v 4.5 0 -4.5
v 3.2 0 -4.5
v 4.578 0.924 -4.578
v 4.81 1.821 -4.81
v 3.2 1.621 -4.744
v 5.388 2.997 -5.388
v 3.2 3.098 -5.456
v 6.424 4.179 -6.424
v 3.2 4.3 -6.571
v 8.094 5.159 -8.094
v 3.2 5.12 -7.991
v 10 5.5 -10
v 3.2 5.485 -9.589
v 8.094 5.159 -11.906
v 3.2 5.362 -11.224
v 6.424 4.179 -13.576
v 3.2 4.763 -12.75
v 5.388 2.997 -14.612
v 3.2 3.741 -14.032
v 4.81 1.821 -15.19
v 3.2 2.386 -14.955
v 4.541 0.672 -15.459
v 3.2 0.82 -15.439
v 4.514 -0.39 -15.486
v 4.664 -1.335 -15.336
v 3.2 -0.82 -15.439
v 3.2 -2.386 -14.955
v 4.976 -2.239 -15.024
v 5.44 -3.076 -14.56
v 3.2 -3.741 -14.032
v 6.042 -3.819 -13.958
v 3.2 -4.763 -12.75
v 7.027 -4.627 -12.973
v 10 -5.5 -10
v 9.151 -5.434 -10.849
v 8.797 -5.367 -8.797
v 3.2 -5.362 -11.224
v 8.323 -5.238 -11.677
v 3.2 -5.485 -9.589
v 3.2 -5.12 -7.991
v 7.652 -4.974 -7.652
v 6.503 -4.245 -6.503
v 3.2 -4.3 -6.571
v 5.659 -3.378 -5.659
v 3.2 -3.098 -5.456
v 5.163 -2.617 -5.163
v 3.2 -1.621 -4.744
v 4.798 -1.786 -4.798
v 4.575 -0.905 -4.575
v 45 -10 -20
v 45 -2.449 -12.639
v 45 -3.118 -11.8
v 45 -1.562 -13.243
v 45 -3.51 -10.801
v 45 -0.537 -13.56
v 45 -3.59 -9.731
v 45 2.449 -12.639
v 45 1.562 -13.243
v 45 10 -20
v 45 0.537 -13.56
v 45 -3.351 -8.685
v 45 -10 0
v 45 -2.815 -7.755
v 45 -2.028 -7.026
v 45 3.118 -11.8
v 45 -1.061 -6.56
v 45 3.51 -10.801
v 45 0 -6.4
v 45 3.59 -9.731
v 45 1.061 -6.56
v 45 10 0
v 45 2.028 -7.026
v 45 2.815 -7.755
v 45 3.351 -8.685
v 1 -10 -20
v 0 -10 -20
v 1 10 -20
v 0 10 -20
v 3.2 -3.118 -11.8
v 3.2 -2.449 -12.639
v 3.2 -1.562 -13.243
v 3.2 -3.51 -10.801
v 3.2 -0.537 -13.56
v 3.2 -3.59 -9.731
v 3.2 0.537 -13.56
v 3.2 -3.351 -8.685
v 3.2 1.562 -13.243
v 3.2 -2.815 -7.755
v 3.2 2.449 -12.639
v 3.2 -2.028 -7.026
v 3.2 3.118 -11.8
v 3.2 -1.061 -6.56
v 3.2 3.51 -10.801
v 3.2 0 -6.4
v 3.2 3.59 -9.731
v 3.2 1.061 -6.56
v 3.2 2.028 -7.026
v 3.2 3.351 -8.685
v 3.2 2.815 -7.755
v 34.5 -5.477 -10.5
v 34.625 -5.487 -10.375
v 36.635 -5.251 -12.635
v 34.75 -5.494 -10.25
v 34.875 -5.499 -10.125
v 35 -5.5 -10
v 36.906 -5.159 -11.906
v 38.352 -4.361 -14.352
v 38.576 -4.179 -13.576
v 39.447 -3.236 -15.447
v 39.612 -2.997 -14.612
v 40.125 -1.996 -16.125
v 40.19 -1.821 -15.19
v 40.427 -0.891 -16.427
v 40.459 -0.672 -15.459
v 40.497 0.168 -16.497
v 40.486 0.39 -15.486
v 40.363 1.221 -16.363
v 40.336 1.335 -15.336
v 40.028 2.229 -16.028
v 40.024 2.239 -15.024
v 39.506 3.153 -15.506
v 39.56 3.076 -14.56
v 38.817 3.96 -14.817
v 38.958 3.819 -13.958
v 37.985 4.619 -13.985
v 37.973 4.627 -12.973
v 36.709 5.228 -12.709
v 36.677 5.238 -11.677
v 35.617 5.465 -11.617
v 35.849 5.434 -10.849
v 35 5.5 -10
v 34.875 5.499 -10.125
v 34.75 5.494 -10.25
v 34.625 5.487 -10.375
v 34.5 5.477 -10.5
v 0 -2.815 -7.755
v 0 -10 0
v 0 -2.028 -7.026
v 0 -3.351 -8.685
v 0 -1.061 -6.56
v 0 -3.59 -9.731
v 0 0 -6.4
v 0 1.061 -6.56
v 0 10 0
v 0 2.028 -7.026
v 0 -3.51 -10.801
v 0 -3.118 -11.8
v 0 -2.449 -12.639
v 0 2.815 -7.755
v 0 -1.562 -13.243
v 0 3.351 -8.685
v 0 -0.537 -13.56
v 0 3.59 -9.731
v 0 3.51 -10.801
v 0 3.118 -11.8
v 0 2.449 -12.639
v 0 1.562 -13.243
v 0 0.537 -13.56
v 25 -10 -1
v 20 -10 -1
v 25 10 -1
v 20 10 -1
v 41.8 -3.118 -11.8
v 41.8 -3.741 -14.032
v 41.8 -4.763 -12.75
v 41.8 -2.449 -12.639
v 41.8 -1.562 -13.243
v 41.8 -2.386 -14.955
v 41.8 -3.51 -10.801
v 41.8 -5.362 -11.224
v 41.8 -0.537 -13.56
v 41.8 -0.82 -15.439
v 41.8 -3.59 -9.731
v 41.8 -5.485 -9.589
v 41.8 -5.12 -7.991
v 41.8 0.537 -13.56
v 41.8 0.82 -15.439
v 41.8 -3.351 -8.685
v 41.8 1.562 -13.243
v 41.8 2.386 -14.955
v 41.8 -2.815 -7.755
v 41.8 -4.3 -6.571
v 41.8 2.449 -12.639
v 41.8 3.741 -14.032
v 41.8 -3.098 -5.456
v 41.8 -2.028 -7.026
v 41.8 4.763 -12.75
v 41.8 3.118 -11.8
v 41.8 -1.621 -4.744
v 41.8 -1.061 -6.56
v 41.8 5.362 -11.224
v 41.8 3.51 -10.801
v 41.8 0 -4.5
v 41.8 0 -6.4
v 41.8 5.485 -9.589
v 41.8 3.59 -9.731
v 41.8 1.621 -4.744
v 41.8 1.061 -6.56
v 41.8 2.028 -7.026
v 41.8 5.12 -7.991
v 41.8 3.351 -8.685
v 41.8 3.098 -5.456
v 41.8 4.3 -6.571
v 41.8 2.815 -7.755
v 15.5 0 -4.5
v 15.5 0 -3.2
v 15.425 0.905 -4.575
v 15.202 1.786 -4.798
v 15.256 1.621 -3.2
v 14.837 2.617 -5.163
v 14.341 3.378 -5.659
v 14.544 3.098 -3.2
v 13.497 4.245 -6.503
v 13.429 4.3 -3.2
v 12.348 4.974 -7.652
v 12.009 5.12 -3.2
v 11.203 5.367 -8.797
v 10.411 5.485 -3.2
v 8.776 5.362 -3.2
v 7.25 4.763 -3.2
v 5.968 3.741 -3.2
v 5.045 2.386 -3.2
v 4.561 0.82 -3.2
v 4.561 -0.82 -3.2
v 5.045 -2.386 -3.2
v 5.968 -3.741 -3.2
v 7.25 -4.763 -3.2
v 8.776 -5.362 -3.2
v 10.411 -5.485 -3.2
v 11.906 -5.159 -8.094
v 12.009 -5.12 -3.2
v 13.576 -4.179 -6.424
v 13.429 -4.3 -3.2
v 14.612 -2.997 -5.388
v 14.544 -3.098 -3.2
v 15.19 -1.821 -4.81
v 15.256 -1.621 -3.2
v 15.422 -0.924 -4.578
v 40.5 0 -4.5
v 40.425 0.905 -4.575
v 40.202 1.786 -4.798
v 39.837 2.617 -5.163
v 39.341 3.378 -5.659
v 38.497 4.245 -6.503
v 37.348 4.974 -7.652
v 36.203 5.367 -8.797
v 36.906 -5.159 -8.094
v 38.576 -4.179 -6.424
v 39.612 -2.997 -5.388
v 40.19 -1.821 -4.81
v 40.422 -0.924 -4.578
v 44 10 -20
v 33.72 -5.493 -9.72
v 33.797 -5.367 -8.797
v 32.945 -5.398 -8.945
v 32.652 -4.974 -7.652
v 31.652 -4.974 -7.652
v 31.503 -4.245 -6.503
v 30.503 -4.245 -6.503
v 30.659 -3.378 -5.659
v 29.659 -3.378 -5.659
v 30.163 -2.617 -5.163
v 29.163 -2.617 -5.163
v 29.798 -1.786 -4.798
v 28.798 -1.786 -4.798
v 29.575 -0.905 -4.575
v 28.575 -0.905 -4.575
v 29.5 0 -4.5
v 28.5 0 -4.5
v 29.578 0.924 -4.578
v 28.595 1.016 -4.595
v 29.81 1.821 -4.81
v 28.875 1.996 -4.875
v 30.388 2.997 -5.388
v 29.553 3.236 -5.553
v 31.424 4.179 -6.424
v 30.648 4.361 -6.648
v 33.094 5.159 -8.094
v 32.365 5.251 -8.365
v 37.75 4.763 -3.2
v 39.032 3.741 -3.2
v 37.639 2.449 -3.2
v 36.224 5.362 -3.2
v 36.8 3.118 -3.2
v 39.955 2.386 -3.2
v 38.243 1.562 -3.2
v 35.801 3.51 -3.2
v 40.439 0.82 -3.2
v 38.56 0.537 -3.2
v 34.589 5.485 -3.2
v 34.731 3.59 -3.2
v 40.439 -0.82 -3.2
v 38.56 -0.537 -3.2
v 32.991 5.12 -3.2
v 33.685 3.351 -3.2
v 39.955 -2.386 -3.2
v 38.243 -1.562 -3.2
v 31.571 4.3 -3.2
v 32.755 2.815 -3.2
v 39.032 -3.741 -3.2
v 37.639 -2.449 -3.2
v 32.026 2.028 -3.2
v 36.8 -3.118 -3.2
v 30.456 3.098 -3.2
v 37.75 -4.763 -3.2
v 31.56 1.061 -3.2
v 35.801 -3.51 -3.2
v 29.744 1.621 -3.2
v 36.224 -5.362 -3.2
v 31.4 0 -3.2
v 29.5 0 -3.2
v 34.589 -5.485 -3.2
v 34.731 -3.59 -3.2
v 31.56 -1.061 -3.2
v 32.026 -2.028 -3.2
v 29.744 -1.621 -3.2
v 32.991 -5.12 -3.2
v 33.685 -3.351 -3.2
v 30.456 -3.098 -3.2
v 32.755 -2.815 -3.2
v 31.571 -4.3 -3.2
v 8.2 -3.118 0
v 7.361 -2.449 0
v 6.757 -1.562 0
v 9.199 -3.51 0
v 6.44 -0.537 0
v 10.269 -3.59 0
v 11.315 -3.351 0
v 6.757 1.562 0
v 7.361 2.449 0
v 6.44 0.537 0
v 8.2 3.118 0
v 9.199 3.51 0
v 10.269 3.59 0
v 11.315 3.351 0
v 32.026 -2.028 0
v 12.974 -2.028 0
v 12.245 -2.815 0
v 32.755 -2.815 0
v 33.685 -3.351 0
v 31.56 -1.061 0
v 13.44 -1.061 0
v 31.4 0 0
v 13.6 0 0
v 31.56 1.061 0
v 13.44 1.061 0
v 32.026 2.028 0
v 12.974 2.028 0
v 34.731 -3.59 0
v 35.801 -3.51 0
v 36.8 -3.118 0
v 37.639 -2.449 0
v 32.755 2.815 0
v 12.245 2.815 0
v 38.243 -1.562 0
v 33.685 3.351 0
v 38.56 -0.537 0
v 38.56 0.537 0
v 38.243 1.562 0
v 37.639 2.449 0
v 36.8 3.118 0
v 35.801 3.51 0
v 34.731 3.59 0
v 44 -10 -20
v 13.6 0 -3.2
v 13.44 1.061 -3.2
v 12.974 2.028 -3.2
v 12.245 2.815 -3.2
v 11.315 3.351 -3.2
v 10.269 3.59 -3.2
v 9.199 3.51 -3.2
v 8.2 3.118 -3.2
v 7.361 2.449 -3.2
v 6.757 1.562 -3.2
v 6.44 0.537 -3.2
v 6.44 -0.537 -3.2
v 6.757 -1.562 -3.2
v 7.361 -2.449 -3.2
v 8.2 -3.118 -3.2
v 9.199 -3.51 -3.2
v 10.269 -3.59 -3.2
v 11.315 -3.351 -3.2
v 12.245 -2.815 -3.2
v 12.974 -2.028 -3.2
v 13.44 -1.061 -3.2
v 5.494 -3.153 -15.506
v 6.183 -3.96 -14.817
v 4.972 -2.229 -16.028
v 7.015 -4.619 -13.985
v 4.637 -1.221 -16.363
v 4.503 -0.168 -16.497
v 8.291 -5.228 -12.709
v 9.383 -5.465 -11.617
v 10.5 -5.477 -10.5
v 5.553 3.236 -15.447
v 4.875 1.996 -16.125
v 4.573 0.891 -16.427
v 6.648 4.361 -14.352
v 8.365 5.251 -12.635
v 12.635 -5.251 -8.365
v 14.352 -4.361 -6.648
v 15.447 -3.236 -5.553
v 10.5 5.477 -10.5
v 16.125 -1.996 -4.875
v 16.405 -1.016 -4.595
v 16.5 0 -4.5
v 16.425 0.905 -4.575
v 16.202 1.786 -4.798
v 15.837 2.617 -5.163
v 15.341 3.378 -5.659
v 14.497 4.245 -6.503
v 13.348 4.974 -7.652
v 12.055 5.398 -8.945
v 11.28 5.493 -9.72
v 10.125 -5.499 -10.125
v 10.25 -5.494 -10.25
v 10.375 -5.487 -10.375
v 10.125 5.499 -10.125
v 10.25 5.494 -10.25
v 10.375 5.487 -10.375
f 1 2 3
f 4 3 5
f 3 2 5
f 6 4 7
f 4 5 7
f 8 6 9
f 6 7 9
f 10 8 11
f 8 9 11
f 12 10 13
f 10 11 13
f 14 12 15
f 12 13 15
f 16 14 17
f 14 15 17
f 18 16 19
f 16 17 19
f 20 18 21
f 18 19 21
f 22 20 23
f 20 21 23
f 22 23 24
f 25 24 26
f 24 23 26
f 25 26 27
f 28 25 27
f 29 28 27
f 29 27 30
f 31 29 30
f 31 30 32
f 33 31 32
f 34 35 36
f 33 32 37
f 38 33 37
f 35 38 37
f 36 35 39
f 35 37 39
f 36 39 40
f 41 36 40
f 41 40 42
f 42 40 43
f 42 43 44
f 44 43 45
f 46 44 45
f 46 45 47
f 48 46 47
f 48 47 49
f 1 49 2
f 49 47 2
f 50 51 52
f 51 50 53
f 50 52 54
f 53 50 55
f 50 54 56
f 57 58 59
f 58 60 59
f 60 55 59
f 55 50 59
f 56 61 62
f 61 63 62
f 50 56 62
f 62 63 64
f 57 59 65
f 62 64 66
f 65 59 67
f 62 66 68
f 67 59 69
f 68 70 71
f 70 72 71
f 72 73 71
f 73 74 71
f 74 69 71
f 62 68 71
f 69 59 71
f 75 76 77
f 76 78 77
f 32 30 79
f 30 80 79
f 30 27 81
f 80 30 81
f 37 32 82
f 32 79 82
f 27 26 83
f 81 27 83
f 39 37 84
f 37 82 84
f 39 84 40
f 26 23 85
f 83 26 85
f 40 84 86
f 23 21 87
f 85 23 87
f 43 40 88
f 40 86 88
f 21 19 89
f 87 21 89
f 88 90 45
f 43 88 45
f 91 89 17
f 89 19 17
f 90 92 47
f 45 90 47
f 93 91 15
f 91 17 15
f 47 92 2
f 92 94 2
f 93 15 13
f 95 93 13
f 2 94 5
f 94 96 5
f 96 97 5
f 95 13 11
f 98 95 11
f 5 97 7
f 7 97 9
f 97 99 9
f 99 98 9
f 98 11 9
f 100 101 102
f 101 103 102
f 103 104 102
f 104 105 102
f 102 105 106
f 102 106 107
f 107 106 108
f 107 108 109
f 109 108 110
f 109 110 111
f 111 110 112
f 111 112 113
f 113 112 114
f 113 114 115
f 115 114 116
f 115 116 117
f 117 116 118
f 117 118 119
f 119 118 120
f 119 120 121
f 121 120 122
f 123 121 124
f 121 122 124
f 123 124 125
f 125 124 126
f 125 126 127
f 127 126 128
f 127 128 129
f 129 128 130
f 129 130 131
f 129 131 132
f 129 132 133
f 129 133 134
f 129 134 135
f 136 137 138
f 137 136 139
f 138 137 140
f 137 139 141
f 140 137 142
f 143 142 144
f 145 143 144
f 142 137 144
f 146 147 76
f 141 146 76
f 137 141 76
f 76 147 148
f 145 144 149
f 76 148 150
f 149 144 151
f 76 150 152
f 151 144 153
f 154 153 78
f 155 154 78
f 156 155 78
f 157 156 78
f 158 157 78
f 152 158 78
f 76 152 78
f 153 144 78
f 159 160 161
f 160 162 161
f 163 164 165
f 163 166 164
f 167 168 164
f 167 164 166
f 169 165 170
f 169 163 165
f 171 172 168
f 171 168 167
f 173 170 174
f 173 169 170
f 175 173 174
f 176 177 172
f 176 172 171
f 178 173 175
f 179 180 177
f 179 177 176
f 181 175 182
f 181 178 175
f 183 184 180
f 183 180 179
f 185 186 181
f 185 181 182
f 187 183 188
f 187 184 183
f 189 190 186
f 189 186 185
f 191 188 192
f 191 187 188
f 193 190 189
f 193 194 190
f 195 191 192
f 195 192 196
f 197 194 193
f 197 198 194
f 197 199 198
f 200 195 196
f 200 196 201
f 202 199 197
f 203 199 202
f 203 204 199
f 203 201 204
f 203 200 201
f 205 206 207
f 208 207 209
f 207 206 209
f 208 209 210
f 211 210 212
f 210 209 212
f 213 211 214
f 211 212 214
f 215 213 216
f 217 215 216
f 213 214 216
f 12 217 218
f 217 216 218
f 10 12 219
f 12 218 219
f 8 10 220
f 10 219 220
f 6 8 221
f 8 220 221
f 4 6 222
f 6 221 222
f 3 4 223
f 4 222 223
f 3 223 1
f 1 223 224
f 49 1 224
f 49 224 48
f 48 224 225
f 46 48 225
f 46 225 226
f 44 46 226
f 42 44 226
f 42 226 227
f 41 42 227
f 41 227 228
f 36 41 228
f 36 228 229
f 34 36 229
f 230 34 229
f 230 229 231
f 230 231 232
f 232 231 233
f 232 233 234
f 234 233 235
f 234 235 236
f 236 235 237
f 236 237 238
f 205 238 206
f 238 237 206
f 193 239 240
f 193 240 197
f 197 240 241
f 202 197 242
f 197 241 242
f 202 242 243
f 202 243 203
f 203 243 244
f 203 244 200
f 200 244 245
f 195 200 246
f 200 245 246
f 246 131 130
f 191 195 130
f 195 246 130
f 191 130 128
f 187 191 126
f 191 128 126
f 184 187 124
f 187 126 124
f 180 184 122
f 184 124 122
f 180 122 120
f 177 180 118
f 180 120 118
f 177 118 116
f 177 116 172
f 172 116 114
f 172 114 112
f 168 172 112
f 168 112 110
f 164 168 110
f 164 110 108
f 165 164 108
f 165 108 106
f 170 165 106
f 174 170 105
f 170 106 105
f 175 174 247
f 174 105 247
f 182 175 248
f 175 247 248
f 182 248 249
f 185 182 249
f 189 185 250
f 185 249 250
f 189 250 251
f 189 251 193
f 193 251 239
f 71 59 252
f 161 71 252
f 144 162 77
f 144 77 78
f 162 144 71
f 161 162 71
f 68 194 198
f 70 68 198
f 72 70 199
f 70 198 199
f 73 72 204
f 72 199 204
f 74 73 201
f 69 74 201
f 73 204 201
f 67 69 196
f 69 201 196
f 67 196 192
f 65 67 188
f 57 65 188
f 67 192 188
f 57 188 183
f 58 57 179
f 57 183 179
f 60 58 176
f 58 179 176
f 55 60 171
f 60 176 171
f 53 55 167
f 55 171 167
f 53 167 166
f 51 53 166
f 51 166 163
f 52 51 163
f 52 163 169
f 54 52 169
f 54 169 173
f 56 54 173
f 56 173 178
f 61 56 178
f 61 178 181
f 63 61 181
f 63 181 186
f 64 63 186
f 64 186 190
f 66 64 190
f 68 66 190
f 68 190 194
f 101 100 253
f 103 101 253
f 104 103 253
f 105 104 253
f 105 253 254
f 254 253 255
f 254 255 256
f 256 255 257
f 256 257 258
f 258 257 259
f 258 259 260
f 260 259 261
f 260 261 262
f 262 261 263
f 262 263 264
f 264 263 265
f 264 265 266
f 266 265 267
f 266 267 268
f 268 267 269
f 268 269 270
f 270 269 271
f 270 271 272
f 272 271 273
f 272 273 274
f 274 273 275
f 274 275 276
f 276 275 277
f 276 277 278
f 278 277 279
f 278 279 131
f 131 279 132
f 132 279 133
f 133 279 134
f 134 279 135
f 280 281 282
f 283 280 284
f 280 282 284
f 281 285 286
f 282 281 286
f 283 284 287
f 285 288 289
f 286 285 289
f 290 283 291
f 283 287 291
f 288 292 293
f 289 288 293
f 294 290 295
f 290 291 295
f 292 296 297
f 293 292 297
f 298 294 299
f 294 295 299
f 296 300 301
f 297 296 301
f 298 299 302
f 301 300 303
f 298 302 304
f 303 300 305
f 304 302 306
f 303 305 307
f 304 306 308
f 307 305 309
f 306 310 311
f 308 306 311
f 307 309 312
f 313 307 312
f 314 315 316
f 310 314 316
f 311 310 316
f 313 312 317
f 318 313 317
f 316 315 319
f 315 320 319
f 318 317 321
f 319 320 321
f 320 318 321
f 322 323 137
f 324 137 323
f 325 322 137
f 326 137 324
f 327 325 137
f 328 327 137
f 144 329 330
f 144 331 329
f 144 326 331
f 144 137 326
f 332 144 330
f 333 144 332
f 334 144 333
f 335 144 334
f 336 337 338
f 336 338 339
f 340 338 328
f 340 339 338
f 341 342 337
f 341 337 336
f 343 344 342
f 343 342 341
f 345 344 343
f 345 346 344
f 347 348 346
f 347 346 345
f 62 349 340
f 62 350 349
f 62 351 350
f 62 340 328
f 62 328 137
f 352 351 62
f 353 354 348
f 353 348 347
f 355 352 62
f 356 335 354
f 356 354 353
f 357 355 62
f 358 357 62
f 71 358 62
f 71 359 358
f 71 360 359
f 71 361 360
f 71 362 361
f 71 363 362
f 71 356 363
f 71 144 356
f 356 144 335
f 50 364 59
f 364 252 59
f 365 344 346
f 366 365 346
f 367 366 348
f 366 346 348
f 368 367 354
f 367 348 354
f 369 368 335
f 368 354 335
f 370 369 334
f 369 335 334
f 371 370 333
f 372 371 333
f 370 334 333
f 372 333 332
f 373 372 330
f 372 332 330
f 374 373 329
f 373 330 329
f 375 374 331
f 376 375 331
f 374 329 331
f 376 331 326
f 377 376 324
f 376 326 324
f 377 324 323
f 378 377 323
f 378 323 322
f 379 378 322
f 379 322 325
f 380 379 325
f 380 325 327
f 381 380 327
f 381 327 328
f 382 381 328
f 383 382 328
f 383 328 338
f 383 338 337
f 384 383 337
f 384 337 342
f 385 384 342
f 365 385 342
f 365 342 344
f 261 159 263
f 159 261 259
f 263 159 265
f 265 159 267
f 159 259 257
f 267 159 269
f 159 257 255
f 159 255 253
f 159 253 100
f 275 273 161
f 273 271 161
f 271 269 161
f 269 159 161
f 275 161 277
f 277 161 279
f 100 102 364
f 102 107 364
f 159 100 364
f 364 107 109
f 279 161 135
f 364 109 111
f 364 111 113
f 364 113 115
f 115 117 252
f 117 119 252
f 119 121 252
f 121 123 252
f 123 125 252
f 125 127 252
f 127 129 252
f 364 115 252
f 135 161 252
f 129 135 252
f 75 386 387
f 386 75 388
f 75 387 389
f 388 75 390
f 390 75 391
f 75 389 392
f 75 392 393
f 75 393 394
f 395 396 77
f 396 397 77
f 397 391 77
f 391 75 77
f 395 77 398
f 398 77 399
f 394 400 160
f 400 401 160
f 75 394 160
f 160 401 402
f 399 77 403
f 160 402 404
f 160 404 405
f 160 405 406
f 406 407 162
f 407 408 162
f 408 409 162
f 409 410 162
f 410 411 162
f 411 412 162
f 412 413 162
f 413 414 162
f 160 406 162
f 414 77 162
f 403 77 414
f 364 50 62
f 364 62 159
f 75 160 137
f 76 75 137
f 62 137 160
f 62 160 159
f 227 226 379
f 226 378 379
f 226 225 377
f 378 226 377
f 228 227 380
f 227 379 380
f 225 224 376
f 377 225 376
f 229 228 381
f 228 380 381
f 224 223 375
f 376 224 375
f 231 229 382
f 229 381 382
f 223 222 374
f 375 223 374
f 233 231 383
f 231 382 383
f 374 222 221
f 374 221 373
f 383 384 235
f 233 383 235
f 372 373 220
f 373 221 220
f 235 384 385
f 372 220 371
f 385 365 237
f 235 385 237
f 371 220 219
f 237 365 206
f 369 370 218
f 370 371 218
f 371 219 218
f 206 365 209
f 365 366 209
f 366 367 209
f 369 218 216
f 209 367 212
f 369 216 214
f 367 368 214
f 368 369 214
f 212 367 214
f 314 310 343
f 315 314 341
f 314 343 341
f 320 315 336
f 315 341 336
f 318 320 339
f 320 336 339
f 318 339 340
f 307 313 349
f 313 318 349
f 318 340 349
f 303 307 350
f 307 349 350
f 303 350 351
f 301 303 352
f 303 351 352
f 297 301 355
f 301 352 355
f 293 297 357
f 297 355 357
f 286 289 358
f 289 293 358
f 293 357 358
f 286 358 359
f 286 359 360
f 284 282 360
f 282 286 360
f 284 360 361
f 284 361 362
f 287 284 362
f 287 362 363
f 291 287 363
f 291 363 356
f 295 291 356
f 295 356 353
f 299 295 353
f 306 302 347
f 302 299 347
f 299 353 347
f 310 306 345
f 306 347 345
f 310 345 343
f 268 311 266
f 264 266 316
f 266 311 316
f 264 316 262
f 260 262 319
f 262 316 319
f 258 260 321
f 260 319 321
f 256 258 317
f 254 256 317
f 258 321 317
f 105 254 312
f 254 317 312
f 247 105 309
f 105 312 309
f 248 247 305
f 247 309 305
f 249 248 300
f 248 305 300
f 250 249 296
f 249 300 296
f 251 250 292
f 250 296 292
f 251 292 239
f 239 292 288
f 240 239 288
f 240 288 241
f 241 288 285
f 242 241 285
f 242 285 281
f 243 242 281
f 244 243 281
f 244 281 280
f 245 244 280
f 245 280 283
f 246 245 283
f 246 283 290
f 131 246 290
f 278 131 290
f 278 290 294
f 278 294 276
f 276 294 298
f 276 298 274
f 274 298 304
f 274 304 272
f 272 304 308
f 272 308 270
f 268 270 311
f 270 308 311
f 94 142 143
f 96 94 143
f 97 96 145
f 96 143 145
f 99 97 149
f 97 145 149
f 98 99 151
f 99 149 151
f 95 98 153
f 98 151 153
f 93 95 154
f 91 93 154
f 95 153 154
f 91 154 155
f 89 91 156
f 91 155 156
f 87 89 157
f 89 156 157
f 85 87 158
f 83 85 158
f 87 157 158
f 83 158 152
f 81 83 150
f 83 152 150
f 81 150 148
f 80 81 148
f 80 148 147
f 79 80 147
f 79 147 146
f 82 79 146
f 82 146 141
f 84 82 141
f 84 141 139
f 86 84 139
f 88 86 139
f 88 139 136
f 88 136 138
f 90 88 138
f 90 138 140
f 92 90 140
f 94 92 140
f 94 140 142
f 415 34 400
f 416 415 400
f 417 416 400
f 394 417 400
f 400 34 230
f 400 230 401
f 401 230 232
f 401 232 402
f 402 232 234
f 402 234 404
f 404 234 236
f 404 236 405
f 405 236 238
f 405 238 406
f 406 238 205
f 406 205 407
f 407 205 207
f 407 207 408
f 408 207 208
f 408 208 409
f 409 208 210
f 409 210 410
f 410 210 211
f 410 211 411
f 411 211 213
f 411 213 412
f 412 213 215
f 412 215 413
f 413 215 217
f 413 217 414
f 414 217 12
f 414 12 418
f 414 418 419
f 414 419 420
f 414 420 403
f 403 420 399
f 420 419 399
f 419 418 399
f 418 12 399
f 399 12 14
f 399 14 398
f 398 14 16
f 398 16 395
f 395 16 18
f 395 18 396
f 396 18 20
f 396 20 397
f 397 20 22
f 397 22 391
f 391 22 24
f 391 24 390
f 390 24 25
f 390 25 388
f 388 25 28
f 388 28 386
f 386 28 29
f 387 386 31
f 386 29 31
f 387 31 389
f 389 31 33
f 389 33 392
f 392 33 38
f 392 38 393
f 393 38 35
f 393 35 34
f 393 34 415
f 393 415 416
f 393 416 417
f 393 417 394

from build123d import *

# Parameters (mm, degrees)
BOSS_EXTRUDE1_DEPTH = 10
CUT_EXTRUDE1_REACH  = 52.249
SKETCH3_R           = 3.6
CUT_EXTRUDE3_REACH  = 55.449
CUT_EXTRUDE3_START  = -3.2
SKETCH3_4_R         = 5.5
SKETCH3_4_R_2       = 3.6
CUT_EXTRUDE2_REACH  = 52.249
SKETCH4_R           = 3.6
CUT_EXTRUDE4_START  = -3.2
SKETCH4_3_R         = 5.5
SKETCH4_3_R_2       = 3.6
CUT_EXTRUDE4_DEPTH  = 38.6


with BuildPart() as part:
    # Sketch2 → Boss-Extrude1 (new, symmetric)
    with BuildSketch(Plane(origin=(0, 0, 0), x_dir=(1, 0, 0), z_dir=(0, 1, 0))):
        Polygon((0, 0), (0, 20), (1, 20), (20, 1), (25, 1), (44, 20), (45, 20), (45, 0), (25, 0), (20, 0), align=None)
    extrude(amount=BOSS_EXTRUDE1_DEPTH, both=True)

    # Cut-Extrude1: up to this face of the body (flat: up to its plane)
    cut_extrude1_end = Plane(part.part.faces().sort_by_distance((0.5, 0, -20))[0])
    # Sketch3 → Cut-Extrude1 (cut, up to the picked face)
    with BuildSketch(Plane.XY, mode=Mode.PRIVATE) as cut_extrude1_sk1:
        with Locations((10, 0)):
            Circle(SKETCH3_R)
    cut_extrude1_tool1 = split(extrude(cut_extrude1_sk1.sketch, amount=-CUT_EXTRUDE1_REACH, mode=Mode.PRIVATE), bisect_by=cut_extrude1_end, keep=Keep.BOTH, mode=Mode.PRIVATE)
    # Sketch3 → Cut-Extrude1 (cut, up to the picked face)
    with BuildSketch(Plane.XY, mode=Mode.PRIVATE) as cut_extrude1_sk2:
        with Locations(Location((35, 0, 0), (0, 0, 180))):
            Circle(SKETCH3_R)
    cut_extrude1_tool2 = split(extrude(cut_extrude1_sk2.sketch, amount=-CUT_EXTRUDE1_REACH, mode=Mode.PRIVATE), bisect_by=cut_extrude1_end, keep=Keep.BOTH, mode=Mode.PRIVATE)
    add(cut_extrude1_tool1.solids().sort_by(Axis((10, 0, 0), (0, 0, -1)))[0], mode=Mode.SUBTRACT)
    add(cut_extrude1_tool2.solids().sort_by(Axis((35, 0, 0), (0, 0, -1)))[0], mode=Mode.SUBTRACT)

    # Cut-Extrude3: up to this face of the body (flat: up to its plane)
    cut_extrude3_end = Plane(part.part.faces().sort_by_distance((0.5, 0, -20))[0])
    # Sketch3<4> → Cut-Extrude3 (cut, up to the picked face)
    with BuildSketch(Plane.XY.offset(CUT_EXTRUDE3_START), mode=Mode.PRIVATE) as cut_extrude3_sk1:
        with Locations((10, 0)):
            Circle(SKETCH3_4_R)
        with Locations((10, 0)):
            Circle(SKETCH3_4_R_2, mode=Mode.SUBTRACT)
    cut_extrude3_tool1 = split(extrude(cut_extrude3_sk1.sketch, amount=-CUT_EXTRUDE3_REACH, mode=Mode.PRIVATE), bisect_by=cut_extrude3_end, keep=Keep.BOTH, mode=Mode.PRIVATE)
    # Sketch3<4> → Cut-Extrude3 (cut, up to the picked face)
    with BuildSketch(Plane.XY.offset(CUT_EXTRUDE3_START), mode=Mode.PRIVATE) as cut_extrude3_sk2:
        with Locations(Location((35, 0, 0), (0, 0, 180))):
            Circle(SKETCH3_4_R)
        with Locations((35, 0)):
            Circle(SKETCH3_4_R_2, mode=Mode.SUBTRACT)
    cut_extrude3_tool2 = split(extrude(cut_extrude3_sk2.sketch, amount=-CUT_EXTRUDE3_REACH, mode=Mode.PRIVATE), bisect_by=cut_extrude3_end, keep=Keep.BOTH, mode=Mode.PRIVATE)
    add(cut_extrude3_tool1.solids().sort_by(Axis((4.655563, 0, -3.2), (0, 0, -1)))[0], mode=Mode.SUBTRACT)
    add(cut_extrude3_tool2.solids().sort_by(Axis((40.344437, 0, -3.2), (0, 0, -1)))[0], mode=Mode.SUBTRACT)

    # Cut-Extrude2: up to this face of the body (flat: up to its plane)
    cut_extrude2_end = Plane(part.part.faces().sort_by_distance((45, 0, -10))[0])
    # Sketch4 → Cut-Extrude2 (cut, up to the picked face)
    with BuildSketch(Plane.ZY, mode=Mode.PRIVATE) as cut_extrude2_sk1:
        with Locations((-10, 0)):
            Circle(SKETCH4_R)
    cut_extrude2_tool1 = split(extrude(cut_extrude2_sk1.sketch, amount=-CUT_EXTRUDE2_REACH, mode=Mode.PRIVATE), bisect_by=cut_extrude2_end, keep=Keep.BOTH, mode=Mode.PRIVATE)
    add(cut_extrude2_tool1.solids().sort_by(Axis((0, 0, -10), (1, 0, 0)))[0], mode=Mode.SUBTRACT)

    # Sketch4<3> → Cut-Extrude4 (cut)
    with BuildSketch(Plane.ZY.offset(CUT_EXTRUDE4_START)):
        with Locations((-10, 0)):
            Circle(SKETCH4_3_R)
        with Locations((-10, 0)):
            Circle(SKETCH4_3_R_2, mode=Mode.SUBTRACT)
    extrude(amount=-CUT_EXTRUDE4_DEPTH, mode=Mode.SUBTRACT)


solid = part.part
